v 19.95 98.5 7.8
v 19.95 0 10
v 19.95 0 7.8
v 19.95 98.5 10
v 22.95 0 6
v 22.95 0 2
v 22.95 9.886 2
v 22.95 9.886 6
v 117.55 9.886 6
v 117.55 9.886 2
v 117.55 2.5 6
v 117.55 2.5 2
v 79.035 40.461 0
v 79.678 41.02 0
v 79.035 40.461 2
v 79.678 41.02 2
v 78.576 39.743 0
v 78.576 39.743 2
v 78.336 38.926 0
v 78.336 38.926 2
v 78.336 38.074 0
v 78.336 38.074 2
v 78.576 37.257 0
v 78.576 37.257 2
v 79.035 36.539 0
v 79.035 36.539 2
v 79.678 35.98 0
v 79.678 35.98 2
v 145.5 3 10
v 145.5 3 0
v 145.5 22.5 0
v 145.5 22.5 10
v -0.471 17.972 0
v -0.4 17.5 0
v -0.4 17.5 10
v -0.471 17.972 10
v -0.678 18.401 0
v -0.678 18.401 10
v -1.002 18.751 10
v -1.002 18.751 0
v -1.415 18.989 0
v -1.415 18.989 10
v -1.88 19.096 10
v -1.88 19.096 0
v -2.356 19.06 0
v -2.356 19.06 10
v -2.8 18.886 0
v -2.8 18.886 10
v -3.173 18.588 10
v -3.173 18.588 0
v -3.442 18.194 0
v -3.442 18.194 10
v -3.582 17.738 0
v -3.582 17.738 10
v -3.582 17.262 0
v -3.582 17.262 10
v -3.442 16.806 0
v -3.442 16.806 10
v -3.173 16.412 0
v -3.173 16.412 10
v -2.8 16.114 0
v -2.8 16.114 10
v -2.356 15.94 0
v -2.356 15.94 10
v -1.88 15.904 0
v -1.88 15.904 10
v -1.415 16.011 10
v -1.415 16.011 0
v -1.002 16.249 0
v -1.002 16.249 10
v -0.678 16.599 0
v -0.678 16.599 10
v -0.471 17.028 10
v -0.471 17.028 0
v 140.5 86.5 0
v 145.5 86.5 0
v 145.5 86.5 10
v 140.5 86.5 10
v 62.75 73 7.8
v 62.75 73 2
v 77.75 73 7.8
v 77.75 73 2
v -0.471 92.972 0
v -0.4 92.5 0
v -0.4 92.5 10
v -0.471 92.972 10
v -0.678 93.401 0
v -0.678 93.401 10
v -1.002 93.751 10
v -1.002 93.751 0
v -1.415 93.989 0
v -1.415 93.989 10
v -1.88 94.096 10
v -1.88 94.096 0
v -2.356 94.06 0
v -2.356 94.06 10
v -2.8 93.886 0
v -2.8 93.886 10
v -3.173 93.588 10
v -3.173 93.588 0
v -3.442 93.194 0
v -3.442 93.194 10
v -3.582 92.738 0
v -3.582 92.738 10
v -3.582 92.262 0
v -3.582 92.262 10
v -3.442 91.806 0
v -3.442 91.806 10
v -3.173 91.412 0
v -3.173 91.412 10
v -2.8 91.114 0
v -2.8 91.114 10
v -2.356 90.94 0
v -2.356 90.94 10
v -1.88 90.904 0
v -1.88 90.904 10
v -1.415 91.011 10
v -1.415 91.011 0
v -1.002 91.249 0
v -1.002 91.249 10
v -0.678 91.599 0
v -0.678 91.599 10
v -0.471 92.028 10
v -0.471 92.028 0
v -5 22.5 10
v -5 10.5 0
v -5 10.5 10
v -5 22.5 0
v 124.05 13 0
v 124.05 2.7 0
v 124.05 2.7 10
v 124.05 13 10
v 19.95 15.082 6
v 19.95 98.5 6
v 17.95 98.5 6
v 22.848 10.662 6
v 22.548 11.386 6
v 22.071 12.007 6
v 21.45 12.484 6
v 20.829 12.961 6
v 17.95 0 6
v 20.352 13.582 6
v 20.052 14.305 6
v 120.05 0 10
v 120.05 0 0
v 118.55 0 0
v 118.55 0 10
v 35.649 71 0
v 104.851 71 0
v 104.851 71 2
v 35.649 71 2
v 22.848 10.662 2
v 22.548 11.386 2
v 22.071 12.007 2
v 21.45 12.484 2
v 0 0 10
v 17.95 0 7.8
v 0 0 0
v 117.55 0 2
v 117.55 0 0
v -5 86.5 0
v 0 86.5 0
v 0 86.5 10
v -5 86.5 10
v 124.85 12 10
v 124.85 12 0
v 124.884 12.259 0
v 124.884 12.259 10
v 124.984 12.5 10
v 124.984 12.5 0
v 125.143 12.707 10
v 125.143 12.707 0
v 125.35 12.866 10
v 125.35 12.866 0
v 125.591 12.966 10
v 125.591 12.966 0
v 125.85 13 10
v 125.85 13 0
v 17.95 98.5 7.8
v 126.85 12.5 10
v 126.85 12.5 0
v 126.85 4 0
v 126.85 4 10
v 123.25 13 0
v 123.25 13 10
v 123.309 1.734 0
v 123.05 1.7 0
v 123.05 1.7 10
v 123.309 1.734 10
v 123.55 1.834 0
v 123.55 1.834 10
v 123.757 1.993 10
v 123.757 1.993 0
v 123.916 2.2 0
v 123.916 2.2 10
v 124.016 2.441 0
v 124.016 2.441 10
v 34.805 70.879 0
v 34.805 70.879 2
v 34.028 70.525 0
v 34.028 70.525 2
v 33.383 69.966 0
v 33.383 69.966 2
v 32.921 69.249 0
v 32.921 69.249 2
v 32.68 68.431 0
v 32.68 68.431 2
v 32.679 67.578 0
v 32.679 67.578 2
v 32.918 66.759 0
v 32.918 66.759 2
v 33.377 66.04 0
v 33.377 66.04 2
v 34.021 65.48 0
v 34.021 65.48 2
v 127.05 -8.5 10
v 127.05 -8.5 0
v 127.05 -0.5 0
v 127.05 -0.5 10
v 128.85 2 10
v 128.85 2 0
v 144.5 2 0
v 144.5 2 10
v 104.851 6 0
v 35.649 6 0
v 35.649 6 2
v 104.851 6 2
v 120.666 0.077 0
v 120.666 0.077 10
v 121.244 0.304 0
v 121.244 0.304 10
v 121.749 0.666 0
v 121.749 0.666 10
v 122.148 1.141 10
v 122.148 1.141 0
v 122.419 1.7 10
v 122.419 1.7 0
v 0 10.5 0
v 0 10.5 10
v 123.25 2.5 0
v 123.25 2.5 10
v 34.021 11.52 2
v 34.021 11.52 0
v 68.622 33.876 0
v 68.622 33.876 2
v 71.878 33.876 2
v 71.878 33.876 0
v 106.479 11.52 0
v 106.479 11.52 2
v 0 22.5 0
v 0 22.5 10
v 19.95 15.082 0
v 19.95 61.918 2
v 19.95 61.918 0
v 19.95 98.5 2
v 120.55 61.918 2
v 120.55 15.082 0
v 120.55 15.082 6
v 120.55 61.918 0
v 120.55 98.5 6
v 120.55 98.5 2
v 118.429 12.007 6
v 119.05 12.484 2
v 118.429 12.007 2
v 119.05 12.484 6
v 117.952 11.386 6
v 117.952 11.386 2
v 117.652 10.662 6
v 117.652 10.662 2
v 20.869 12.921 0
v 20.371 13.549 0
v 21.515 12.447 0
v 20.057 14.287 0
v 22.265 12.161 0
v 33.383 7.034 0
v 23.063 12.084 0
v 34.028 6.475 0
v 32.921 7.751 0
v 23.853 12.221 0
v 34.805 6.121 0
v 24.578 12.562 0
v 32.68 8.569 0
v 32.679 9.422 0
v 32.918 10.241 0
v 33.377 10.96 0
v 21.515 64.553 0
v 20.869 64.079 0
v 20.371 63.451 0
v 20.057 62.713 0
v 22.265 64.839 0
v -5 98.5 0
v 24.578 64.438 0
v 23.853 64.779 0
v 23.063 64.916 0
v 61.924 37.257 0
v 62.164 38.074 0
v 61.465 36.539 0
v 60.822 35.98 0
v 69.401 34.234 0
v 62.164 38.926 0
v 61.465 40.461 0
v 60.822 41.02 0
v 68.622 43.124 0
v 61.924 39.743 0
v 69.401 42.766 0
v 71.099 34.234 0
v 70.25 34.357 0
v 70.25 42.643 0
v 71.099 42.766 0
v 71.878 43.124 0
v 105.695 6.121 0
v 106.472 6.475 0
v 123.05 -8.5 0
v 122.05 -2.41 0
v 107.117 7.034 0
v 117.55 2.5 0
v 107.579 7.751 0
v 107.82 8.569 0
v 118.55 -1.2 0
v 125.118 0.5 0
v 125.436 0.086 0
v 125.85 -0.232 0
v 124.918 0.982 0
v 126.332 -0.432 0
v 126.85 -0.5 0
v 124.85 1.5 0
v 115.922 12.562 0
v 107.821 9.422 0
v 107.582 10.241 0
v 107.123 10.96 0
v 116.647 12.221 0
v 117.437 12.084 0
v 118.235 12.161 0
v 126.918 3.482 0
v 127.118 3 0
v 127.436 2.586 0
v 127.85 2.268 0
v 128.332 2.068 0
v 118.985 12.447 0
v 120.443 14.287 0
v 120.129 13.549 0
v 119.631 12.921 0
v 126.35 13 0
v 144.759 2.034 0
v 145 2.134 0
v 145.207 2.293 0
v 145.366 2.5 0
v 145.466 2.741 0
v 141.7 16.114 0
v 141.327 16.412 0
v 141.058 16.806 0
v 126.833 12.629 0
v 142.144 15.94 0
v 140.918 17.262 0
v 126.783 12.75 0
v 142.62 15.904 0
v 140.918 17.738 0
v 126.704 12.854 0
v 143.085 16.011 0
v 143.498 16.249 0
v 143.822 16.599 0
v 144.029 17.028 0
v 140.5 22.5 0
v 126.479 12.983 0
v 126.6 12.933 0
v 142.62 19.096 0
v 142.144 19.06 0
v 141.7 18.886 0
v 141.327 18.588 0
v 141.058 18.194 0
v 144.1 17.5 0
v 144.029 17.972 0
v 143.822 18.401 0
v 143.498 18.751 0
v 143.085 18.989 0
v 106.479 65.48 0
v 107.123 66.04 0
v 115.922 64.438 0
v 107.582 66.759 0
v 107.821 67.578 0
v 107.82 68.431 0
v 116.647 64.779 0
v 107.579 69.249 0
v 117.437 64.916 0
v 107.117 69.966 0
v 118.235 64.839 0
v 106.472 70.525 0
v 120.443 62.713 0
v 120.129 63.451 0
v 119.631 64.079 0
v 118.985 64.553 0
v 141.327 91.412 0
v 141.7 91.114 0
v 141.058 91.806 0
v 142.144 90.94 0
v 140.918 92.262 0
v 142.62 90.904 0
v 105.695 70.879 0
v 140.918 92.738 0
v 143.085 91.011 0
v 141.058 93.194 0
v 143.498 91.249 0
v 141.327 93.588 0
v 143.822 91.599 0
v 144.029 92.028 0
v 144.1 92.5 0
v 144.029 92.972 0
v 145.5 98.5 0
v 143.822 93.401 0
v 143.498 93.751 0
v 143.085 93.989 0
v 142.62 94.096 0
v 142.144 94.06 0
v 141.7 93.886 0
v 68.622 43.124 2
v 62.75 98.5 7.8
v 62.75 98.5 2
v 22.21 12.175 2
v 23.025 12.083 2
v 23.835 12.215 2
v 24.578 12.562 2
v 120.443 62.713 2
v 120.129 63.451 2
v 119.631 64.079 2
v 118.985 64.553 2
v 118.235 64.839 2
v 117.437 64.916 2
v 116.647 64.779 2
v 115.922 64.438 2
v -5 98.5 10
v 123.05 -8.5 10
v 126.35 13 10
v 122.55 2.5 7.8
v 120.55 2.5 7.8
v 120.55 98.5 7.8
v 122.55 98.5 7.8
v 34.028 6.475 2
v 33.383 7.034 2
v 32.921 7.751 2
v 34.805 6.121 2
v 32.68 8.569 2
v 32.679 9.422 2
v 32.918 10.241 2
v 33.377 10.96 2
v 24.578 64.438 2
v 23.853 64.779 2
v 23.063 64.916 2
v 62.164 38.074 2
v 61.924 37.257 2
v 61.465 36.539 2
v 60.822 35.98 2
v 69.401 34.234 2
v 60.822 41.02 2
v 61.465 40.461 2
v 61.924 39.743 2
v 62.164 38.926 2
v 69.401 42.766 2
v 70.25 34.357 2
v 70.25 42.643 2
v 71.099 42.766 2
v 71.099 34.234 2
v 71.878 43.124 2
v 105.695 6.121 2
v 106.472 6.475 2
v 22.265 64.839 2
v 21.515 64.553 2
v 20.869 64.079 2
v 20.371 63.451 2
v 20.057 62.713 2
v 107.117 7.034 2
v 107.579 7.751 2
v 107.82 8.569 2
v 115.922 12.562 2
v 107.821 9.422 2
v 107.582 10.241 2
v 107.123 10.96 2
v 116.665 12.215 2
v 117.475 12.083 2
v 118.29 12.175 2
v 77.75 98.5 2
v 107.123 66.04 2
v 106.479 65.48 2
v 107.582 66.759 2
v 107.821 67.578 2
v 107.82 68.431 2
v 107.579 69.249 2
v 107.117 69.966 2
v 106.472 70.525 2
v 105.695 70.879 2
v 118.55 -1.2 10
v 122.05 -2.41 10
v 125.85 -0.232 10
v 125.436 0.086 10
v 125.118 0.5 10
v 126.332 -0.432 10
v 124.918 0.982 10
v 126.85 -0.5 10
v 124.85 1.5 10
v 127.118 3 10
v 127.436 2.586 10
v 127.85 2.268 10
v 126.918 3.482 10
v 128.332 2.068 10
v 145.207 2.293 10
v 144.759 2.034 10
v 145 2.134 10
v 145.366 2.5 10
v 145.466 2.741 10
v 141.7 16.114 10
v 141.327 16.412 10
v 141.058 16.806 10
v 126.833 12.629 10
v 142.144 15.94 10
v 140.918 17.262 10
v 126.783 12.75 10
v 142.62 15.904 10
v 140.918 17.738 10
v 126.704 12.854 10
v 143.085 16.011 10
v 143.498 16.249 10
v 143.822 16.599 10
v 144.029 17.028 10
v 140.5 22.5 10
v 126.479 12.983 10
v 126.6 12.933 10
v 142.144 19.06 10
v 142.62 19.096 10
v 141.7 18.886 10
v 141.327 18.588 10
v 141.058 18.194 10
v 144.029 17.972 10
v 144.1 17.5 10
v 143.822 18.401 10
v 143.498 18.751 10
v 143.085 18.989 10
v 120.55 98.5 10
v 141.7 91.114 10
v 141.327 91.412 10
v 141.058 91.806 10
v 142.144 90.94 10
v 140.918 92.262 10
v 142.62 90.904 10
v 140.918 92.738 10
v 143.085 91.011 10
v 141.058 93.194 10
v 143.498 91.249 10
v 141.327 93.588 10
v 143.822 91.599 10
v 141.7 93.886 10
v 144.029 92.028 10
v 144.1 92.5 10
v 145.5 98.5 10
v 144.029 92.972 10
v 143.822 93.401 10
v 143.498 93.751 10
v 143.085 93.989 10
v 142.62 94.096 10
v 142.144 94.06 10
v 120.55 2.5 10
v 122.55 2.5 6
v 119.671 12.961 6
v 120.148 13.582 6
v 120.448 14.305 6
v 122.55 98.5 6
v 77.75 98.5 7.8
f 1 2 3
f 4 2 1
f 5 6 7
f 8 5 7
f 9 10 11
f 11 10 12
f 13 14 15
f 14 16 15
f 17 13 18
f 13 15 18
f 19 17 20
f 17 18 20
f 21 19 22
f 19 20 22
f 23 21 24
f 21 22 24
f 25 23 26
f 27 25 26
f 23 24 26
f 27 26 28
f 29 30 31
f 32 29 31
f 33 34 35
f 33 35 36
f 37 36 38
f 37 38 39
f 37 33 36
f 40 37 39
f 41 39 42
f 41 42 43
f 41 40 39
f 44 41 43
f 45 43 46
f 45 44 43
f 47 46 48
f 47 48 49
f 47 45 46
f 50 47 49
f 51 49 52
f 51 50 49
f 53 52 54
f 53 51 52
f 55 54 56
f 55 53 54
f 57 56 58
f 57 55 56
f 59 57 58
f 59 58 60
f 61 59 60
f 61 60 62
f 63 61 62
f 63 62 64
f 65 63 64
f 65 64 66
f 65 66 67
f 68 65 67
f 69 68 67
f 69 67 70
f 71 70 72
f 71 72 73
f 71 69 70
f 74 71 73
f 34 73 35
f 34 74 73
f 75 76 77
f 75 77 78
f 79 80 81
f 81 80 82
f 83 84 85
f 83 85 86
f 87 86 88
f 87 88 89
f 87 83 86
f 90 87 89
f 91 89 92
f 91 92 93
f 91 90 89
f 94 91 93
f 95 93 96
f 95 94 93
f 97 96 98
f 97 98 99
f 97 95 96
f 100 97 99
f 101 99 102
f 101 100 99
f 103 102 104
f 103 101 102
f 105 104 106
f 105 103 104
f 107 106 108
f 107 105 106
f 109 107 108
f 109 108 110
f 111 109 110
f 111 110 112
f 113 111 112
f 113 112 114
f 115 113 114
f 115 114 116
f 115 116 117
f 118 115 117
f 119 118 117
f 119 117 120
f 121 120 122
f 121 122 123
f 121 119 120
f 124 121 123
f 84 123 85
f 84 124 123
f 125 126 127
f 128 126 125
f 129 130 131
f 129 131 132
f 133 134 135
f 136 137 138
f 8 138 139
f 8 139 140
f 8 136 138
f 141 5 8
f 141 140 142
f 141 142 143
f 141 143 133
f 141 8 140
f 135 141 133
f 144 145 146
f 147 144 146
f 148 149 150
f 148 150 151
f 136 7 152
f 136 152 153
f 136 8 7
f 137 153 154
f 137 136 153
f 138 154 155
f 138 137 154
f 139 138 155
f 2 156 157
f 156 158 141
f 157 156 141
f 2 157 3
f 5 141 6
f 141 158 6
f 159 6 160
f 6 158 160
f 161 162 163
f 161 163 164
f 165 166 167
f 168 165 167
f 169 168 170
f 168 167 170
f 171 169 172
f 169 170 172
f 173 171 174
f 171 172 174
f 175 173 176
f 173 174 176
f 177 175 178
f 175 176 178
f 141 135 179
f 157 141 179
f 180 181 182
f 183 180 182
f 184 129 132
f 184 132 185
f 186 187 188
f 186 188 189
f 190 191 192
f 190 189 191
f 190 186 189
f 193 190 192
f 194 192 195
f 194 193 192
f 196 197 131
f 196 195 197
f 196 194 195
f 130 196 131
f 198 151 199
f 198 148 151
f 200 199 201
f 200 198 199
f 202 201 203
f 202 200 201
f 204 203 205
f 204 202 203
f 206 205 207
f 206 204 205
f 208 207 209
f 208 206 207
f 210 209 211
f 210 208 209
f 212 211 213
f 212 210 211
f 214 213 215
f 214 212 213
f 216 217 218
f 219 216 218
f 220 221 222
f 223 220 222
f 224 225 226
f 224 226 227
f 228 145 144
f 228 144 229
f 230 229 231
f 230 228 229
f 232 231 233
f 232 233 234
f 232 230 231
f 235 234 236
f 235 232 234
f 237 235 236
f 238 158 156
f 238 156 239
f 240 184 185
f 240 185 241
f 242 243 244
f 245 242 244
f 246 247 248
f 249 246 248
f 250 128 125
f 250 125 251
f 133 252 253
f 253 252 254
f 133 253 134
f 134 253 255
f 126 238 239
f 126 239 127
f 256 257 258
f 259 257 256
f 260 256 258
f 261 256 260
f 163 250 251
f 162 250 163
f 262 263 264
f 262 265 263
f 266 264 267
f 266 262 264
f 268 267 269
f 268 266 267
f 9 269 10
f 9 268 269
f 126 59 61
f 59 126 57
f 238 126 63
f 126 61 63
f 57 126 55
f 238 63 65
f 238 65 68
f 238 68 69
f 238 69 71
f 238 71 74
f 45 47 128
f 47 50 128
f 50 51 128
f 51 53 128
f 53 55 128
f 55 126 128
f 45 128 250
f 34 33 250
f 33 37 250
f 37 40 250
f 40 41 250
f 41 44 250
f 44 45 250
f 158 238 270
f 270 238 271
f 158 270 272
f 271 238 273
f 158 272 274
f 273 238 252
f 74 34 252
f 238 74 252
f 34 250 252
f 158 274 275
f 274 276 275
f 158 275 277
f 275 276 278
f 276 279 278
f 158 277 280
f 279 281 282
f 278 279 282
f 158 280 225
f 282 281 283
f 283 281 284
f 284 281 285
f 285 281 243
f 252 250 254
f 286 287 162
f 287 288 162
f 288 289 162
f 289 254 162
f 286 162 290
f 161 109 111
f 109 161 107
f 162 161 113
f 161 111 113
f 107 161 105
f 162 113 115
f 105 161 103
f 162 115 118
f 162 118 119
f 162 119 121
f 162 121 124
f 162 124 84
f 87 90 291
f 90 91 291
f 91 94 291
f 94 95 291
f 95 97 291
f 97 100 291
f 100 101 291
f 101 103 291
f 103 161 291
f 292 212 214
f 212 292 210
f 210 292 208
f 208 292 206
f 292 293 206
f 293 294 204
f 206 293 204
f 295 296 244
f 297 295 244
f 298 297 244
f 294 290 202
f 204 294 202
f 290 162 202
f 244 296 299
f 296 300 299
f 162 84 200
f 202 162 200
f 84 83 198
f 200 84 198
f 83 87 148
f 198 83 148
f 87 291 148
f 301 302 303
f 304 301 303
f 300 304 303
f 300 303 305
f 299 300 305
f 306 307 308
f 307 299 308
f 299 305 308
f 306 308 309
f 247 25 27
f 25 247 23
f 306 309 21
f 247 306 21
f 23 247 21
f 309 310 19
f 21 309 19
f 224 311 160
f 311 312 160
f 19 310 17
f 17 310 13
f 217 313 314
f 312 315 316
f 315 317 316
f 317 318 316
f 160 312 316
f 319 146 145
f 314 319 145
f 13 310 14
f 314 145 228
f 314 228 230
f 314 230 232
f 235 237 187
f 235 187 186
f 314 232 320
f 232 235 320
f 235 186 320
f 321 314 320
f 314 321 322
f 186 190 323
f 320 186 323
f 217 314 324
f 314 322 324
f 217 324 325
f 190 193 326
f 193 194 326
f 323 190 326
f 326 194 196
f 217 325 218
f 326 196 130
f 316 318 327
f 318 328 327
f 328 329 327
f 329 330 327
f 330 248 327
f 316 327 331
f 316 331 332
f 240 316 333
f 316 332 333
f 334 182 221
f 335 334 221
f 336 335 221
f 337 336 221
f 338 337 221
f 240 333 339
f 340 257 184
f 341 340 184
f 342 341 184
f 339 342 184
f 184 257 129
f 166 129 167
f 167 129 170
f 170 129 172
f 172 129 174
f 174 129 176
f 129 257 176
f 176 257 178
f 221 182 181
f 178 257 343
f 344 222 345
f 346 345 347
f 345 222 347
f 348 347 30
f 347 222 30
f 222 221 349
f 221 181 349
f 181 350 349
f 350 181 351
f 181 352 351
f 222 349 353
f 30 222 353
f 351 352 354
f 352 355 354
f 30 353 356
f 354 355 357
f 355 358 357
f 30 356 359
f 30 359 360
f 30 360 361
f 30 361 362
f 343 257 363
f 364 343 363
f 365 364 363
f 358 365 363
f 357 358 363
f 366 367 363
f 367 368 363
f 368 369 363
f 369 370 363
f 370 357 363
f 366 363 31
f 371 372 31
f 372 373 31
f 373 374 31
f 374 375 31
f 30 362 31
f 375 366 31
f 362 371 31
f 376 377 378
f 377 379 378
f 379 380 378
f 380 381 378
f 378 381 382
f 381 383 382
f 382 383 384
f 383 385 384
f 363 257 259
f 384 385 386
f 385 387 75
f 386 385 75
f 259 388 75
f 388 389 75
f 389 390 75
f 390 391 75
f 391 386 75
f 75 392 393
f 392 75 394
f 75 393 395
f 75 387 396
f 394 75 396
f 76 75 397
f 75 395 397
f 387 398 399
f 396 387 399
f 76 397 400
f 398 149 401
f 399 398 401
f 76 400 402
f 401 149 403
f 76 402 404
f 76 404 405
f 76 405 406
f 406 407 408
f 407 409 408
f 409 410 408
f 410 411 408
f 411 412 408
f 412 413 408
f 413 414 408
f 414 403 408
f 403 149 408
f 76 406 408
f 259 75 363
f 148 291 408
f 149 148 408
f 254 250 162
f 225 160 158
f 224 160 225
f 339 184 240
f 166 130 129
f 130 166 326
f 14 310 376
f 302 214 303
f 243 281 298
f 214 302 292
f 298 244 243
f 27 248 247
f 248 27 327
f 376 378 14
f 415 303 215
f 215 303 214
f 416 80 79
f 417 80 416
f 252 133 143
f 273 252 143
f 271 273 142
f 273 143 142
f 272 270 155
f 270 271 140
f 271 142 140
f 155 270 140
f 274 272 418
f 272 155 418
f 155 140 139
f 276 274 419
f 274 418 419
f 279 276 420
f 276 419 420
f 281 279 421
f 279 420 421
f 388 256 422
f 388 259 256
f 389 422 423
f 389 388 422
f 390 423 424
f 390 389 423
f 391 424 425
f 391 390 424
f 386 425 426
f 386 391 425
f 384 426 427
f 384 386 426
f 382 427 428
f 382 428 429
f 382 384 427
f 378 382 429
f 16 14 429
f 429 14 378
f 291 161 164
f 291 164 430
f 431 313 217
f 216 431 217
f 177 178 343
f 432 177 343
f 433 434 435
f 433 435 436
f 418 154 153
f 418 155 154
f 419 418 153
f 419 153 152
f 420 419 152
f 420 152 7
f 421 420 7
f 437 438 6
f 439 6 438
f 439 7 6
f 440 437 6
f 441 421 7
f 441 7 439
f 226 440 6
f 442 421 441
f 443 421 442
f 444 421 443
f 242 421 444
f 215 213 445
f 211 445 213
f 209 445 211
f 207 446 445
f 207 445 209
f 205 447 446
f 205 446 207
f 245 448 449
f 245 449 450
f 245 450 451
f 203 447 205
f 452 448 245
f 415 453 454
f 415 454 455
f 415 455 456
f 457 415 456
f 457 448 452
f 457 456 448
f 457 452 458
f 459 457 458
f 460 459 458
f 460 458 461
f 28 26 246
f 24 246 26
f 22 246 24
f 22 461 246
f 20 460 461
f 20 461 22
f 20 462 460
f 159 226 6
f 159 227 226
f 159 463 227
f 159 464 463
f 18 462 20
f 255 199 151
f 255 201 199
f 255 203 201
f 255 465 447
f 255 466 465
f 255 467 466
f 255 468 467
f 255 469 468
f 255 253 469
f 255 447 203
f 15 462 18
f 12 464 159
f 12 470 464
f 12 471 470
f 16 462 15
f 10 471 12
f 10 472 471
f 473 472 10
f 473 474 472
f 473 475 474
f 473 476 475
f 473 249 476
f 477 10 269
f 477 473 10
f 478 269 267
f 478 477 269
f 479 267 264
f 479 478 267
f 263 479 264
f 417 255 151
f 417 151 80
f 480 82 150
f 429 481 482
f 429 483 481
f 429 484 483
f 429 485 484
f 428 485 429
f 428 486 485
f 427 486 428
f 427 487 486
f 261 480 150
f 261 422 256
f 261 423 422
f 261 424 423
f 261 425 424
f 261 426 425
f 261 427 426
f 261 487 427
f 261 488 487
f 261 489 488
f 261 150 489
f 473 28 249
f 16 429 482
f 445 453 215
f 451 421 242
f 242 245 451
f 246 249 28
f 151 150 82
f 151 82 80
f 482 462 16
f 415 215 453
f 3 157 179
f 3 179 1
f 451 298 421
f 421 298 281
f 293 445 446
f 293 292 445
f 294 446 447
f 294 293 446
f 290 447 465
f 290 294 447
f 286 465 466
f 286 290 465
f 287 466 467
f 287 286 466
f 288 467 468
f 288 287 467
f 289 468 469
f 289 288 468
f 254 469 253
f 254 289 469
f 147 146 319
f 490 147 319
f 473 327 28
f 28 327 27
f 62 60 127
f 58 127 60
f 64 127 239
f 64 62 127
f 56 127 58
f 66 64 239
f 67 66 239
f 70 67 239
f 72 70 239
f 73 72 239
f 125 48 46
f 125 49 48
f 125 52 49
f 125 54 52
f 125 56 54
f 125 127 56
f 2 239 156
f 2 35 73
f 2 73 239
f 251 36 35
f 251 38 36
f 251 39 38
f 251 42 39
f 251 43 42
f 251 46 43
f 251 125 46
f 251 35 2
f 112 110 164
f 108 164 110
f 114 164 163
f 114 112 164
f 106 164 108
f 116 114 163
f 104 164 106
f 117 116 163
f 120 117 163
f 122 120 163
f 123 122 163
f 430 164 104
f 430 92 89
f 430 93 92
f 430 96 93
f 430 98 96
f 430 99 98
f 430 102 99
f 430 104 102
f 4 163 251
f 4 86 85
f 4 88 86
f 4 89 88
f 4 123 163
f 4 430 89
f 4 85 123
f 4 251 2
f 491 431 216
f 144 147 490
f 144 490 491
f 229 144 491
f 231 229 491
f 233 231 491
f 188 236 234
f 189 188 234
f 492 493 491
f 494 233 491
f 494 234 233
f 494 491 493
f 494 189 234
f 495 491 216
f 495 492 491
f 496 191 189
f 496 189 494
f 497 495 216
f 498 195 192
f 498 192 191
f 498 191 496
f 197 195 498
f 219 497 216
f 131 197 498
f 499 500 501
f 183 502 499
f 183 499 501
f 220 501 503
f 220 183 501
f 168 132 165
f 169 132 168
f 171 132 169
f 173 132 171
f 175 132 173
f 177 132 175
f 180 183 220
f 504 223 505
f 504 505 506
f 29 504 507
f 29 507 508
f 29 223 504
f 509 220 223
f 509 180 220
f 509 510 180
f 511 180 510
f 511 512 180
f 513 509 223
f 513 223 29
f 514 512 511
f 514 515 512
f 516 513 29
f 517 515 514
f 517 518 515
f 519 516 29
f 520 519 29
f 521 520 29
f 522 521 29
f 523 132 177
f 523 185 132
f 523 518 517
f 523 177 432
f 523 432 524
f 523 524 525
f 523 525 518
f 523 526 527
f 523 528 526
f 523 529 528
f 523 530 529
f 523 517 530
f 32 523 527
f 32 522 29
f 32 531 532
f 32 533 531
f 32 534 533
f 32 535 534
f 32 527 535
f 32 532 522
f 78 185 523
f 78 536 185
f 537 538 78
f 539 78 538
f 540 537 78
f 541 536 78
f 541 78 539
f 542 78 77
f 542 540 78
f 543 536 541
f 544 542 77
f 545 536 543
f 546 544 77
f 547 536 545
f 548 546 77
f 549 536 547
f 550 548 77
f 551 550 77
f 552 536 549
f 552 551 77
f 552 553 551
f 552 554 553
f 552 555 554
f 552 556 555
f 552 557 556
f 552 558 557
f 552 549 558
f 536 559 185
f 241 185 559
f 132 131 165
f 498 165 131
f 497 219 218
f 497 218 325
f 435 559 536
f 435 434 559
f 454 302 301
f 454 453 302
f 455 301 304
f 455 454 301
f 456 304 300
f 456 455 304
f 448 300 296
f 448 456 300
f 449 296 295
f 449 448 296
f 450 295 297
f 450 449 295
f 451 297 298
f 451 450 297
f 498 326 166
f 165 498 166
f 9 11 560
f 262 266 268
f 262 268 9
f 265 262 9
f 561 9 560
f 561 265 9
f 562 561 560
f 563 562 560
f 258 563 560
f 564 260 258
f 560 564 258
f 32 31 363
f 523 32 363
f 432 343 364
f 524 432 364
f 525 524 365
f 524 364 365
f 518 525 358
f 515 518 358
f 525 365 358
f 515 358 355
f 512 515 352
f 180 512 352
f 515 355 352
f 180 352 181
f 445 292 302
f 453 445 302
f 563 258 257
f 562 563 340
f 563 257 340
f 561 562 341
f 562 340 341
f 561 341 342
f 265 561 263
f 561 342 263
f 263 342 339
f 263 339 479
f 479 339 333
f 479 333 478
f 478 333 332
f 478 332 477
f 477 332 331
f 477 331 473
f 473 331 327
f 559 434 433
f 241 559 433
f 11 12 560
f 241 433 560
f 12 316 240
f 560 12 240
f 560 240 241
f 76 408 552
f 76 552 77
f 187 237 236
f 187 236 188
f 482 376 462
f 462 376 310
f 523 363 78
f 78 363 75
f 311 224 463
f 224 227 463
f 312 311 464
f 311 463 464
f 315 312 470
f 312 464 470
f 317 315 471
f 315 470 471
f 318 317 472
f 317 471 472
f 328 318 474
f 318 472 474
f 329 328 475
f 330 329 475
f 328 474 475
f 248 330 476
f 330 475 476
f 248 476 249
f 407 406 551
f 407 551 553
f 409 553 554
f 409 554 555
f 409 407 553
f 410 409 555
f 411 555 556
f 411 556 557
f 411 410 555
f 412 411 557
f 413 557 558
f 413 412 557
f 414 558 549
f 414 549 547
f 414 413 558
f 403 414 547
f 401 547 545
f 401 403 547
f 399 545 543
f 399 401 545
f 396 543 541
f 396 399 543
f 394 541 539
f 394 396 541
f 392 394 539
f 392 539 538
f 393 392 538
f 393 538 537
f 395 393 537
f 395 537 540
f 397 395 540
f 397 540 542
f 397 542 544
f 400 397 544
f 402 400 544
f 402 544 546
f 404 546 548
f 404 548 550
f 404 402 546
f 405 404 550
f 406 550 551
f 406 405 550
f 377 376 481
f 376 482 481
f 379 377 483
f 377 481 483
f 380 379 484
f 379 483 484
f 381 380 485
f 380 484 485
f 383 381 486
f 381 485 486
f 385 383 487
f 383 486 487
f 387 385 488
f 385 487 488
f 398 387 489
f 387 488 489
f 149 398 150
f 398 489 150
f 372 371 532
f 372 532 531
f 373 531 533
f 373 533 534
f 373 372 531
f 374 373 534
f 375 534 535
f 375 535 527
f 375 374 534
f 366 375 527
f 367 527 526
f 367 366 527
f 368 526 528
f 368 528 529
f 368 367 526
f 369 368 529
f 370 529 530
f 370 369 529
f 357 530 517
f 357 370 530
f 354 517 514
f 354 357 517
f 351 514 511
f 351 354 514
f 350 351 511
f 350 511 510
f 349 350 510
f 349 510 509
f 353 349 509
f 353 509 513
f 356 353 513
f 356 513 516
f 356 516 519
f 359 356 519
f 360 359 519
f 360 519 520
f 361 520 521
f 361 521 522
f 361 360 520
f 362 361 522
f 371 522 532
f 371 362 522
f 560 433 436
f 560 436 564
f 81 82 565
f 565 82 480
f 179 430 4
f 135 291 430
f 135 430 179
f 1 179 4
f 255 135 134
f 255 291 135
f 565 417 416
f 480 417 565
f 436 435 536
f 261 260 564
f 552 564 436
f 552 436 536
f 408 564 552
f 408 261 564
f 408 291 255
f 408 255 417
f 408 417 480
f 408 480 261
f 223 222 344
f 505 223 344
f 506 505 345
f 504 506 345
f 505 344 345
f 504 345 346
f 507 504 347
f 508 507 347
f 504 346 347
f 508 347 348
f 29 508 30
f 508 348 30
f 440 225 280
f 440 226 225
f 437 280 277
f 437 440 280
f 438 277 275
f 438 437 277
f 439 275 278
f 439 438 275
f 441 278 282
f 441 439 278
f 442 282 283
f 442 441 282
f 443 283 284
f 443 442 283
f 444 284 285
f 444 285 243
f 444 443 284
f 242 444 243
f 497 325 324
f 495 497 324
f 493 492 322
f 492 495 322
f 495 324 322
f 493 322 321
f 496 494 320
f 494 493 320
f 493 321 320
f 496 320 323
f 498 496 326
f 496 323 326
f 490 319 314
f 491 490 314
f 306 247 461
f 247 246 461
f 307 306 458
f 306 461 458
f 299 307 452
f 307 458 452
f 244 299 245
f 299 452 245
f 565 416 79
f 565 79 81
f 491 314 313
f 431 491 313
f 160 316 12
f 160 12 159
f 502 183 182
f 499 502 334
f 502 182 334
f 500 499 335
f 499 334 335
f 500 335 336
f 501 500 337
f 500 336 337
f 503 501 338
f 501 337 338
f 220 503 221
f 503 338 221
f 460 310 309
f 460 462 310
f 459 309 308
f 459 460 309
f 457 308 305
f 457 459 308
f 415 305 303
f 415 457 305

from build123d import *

# Parameters (mm, degrees)
SKETCH2_W           = 140.5
SKETCH2_H           = 98.5
BOSS_EXTRUDE6_DEPTH = 10
SKETCH10_W          = 100.6
SKETCH10_H          = 71
CUT_EXTRUDE4_DEPTH  = 172.8793181275746
CUT_EXTRUDE1_DEPTH  = 172.8793181275746
SKETCH5_W           = 100.6
SKETCH5_H           = 6
BOSS_EXTRUDE3_DEPTH = 2
CUT_EXTRUDE2_DEPTH  = 172.8793181275746
SKETCH4_4_R         = 1.5999999999999908
SKETCH4_4_R_2       = 1.599999999999993
SKETCH4_4_R_3       = 1.6000000000000039
SKETCH4_4_R_4       = 1.6000000000000003
BOSS_EXTRUDE7_DEPTH = 10
FILLET1_R           = 3
SKETCH4_3_R         = 1.5999999999999908
SKETCH4_3_R_2       = 1.599999999999993
SKETCH4_3_R_3       = 1.6000000000000039
SKETCH4_3_R_4       = 1.6000000000000003
BOSS_EXTRUDE2_DEPTH = 10
SKETCH7_W           = 100.6
SKETCH7_H           = 27.5
CUT_EXTRUDE3_DEPTH  = 8
SKETCH8_W           = 15.000000000000007
SKETCH8_H           = 25.5
BOSS_EXTRUDE4_DEPTH = 5.8
BOSS_EXTRUDE5_DEPTH = 4
FILLET2_R           = 3


with BuildPart() as part:
    # Sketch2 → Boss-Extrude6 (new body)
    with BuildSketch(Plane.XY):
        with Locations((70.25, 49.25)):
            Rectangle(SKETCH2_W, SKETCH2_H)
    extrude(amount=BOSS_EXTRUDE6_DEPTH)

    # Sketch10 → Cut-Extrude4 (cut, through all)
    with BuildSketch(Plane(origin=(0, 0, 0), x_dir=(-1, 0, 0), z_dir=(0, 0, -1))):
        with Locations((-70.25000000000001, 35.5)):
            Rectangle(SKETCH10_W, SKETCH10_H)
    extrude(amount=-CUT_EXTRUDE4_DEPTH, mode=Mode.SUBTRACT)

    # Sketch3 → Cut-Extrude1 (cut, through all)
    with BuildSketch(Plane.XZ):
        Polygon((17.950000000000006, 7.800000000000001), (122.55000000000001, 7.800000000000013), (122.55000000000001, 6.000000000000013), (17.950000000000006, 6), align=None)
    extrude(amount=-CUT_EXTRUDE1_DEPTH, mode=Mode.SUBTRACT)

    # Sketch5 → Boss-Extrude3 (add)
    with BuildSketch(Plane.XY):
        with Locations((70.25000000000001, 3)):
            Rectangle(SKETCH5_W, SKETCH5_H)
        Polygon((21.57809178761083, 3.480214864097709), (122.17809178761084, 68.48021486409772), (118.92190821238917, 73.51978513590232), (18.321908212389175, 8.519785135902309), align=None)
        Polygon((18.32190821238918, 68.48021486409769), (118.92190821238916, 3.4802148640977055), (122.17809178761082, 8.519785135902305), (21.578091787610838, 73.5197851359023), align=None)
    extrude(amount=BOSS_EXTRUDE3_DEPTH)

    # Sketch4 → Cut-Extrude2 (cut, through all)
    with BuildSketch(Plane.XY):
        with BuildLine():
            ThreePointArc((120.05000000000001, 4.44e-15), (121.50773797371134, 0.46899039884100846), (122.41854385646542, 1.6999999999999988))
            Line((122.41854385646542, 1.7000000000000002), (123.05000000000001, 1.7000000000000002))
            ThreePointArc((123.05000000000001, 1.7000000000000028), (123.75710678118656, 1.99289321881345), (124.05000000000001, 2.7))
            Line((124.05000000000001, 2.7), (124.05000000000001, 12.999999999999996))
            Line((124.05000000000001, 12.999999999999998), (123.25000000000001, 12.999999999999998))
            Line((123.25000000000001, 12.999999999999998), (123.25000000000001, 2.5))
            Line((123.25000000000001, 2.5), (117.55, 2.5))
            Line((117.55, 2.5), (117.55, 0))
            Line((117.55, 0), (118.55, 0))
            Line((118.55, 0), (120.05000000000001, 0))
        make_face()
        with BuildLine():
            ThreePointArc((144.50000000000003, 2), (145.20710678118658, 2.2928932188134525), (145.50000000000006, 3))
            Line((145.50000000000006, 3), (145.50000000000003, -0.5000000000000178))
            Line((145.50000000000003, -0.5000000000000178), (127.05, -0.5000000000000178))
            Line((127.05, -0.5000000000000178), (126.85, -0.5000000000000178))
            ThreePointArc((126.85, -0.5000000000000178), (125.4357864376269, 0.08578643762688709), (124.85, 1.499999999999982))
            Line((124.85, 1.499999999999982), (124.85, 12))
            ThreePointArc((124.85, 12), (125.14289321881344, 12.707106781186548), (125.85, 12.999999999999998))
            Line((125.85, 12.999999999999998), (126.35, 13))
            ThreePointArc((126.35, 13), (126.70355339059327, 12.853553390593271), (126.85, 12.499999999999998))
            Line((126.85, 12.499999999999998), (126.85, 4))
            ThreePointArc((126.85, 4), (127.4357864376269, 2.585786437626905), (128.85, 2))
            Line((128.85, 2), (144.50000000000003, 2))
        make_face()
    extrude(amount=CUT_EXTRUDE2_DEPTH, mode=Mode.SUBTRACT)

    # Sketch4<4> → Boss-Extrude7 (add, through all)
    # profile 1 of 4: a face of its own
    with BuildSketch(Plane.XY):
        with BuildLine():
            Line((128.85, 2), (144.50000000000003, 2))
            ThreePointArc((144.50000000000003, 2), (145.20710678118658, 2.2928932188134525), (145.50000000000006, 3))
            Line((145.50000000000006, 3), (145.50000000000003, 22.5))
            Line((145.50000000000003, 22.5), (140.5, 22.500000000000004))
            Line((140.5, 22.500000000000004), (124.05000000000001, 22.5))
            Line((124.05000000000001, 22.5), (124.05000000000001, 12.999999999999998))
            Line((124.05000000000001, 12.999999999999998), (124.05000000000001, 2.7))
            ThreePointArc((124.05000000000001, 2.7), (123.75710678118656, 1.9928932188134527), (123.05000000000001, 1.7000000000000002))
            Line((123.05000000000001, 1.7000000000000002), (122.41854385646542, 1.7000000000000002))
            ThreePointArc((122.41854385646542, 1.7000000000000002), (121.50773797371134, 0.4689903988410107), (120.05000000000001, 0))
            Line((120.05000000000001, 0), (118.55, 0))
            Line((118.55, 0), (118.55, -1.2))
            Line((118.55, -1.2), (122.05, -2.409773966310486))
            Line((122.05, -2.409773966310486), (123.05, -8.50000000000002))
            Line((123.05, -8.50000000000002), (127.05, -8.500000000000018))
            Line((127.05, -8.500000000000018), (127.05, -0.5000000000000178))
            Line((127.05, -0.5000000000000178), (126.85, -0.5000000000000178))
            ThreePointArc((126.85, -0.5000000000000178), (125.4357864376269, 0.08578643762688709), (124.85, 1.499999999999982))
            Line((124.85, 1.499999999999982), (124.85, 12))
            ThreePointArc((124.85, 12), (125.14289321881344, 12.707106781186548), (125.85, 12.999999999999998))
            Line((125.85, 12.999999999999998), (126.35, 13))
            ThreePointArc((126.35, 13), (126.70355339059327, 12.853553390593271), (126.85, 12.499999999999998))
            Line((126.85, 12.499999999999998), (126.85, 4))
            ThreePointArc((126.85, 4), (127.4357864376269, 2.585786437626905), (128.85, 2))
        make_face()
        with Locations((142.50000000000003, 17.5)):
            Circle(SKETCH4_4_R, mode=Mode.SUBTRACT)
    # profile 2 of 4: a face of its own
    with BuildSketch(Plane.XY):
        Polygon((145.50000000000003, 98.5), (145.50000000000003, 86.50000000000001), (140.5, 86.50000000000003), (140.5, 98.5), align=None)
        with Locations((142.5, 92.5)):
            Circle(SKETCH4_4_R_2, mode=Mode.SUBTRACT)
    # profile 3 of 4: a face of its own
    with BuildSketch(Plane.XY):
        Polygon((0, 98.49999999999999), (0, 86.50000000000001), (-5.000000000000004, 86.5), (-5.000000000000004, 98.49999999999999), align=None)
        with Locations((-1.9999999999999913, 92.5)):
            Circle(SKETCH4_4_R_3, mode=Mode.SUBTRACT)
    # profile 4 of 4: a face of its own
    with BuildSketch(Plane.XY):
        Polygon((8.67e-15, 22.499999999999986), (1.041e-14, 10.49999999999999), (-4.999999999999993, 10.499999999999986), (-4.999999999999996, 22.499999999999982), align=None)
        with Locations((-2.0000000000000018, 17.5)):
            Circle(SKETCH4_4_R_4, mode=Mode.SUBTRACT)
    extrude(amount=BOSS_EXTRUDE7_DEPTH)

    # Fillet1
    fillet1_edges = [part.edges().sort_by_distance(p)[0] for p in [
        (19.95000000000001, 67.42826688999527, 1),
        (19.949999999999992, 9.571733110004725, 1),
        (25.4779438594842, 71.00000000000001, 1),
        (115.02205614051576, 71, 1),
        (120.55000000000001, 9.571733110004711, 1),
        (120.55000000000003, 67.42826688999531, 1),
        (75.77794385948422, 38.50000000000003, 1),
        (70.24999999999997, 42.07173311000473, 1),
        (64.72205614051575, 38.499999999999986, 1),
        (25.477943859484185, 6.000000000000001, 1),
        (70.25, 34.928266889995285, 1),
        (115.0220561405158, 5.999999999999968, 1),
    ]]
    fillet(fillet1_edges, radius=FILLET1_R)

    # Sketch4<3> → Boss-Extrude2 (add, through all)
    # profile 1 of 4: a face of its own
    with BuildSketch(Plane.XY):
        with BuildLine():
            Line((123.05000000000001, 1.7000000000000002), (122.41854385646542, 1.7000000000000002))
            ThreePointArc((122.41854385646542, 1.6999999999999988), (121.50773797371134, 0.46899039884100846), (120.05000000000001, 4.44e-15))
            Line((120.05000000000001, 0), (118.55, 0))
            Line((118.55, 0), (118.55, -1.2))
            Line((118.55, -1.2), (122.05, -2.409773966310486))
            Line((122.05, -2.4097739663104853), (123.05, -8.50000000000002))
            Line((123.05, -8.50000000000002), (127.05, -8.500000000000018))
            Line((127.05, -8.500000000000018), (127.05, -0.5000000000000178))
            Line((127.05, -0.5000000000000178), (126.85, -0.5000000000000178))
            ThreePointArc((126.85, -0.5000000000000151), (125.4357864376269, 0.08578643762688865), (124.85, 1.499999999999982))
            Line((124.85, 1.4999999999999822), (124.85, 12))
            ThreePointArc((124.85, 12), (125.14289321881344, 12.70710678118655), (125.85, 12.999999999999996))
            Line((125.85, 12.999999999999998), (126.35, 13))
            ThreePointArc((126.35, 13), (126.70355339059327, 12.853553390593273), (126.85, 12.499999999999998))
            Line((126.85, 12.499999999999998), (126.85, 4))
            ThreePointArc((126.85, 4), (127.4357864376269, 2.585786437626907), (128.85, 2.000000000000003))
            Line((128.85, 2), (144.50000000000003, 2))
            ThreePointArc((144.50000000000003, 2.000000000000009), (145.20710678118658, 2.292893218813456), (145.50000000000006, 3))
            Line((145.50000000000006, 3), (145.50000000000003, 22.5))
            Line((145.50000000000003, 22.5), (140.5, 22.500000000000004))
            Line((140.5, 22.500000000000004), (124.05000000000001, 22.5))
            Line((124.05000000000001, 22.5), (124.05000000000001, 12.999999999999998))
            Line((124.05000000000001, 12.999999999999996), (124.05000000000001, 2.7))
            ThreePointArc((124.05000000000001, 2.7), (123.75710678118656, 1.99289321881345), (123.05000000000001, 1.7000000000000028))
        make_face()
        with Locations((142.50000000000003, 17.5)):
            Circle(SKETCH4_3_R, mode=Mode.SUBTRACT)
    # profile 2 of 4: a face of its own
    with BuildSketch(Plane.XY):
        Polygon((145.50000000000003, 98.5), (145.50000000000003, 86.50000000000001), (140.5, 86.50000000000003), (140.5, 98.5), align=None)
        with Locations((142.5, 92.5)):
            Circle(SKETCH4_3_R_2, mode=Mode.SUBTRACT)
    # profile 3 of 4: a face of its own
    with BuildSketch(Plane.XY):
        Polygon((0, 98.49999999999999), (0, 86.50000000000001), (-5.000000000000004, 86.5), (-5.000000000000004, 98.49999999999999), align=None)
        with Locations((-1.9999999999999913, 92.5)):
            Circle(SKETCH4_3_R_3, mode=Mode.SUBTRACT)
    # profile 4 of 4: a face of its own
    with BuildSketch(Plane.XY):
        Polygon((8.67e-15, 22.499999999999986), (1.041e-14, 10.49999999999999), (-4.999999999999993, 10.499999999999986), (-4.999999999999996, 22.499999999999982), align=None)
        with Locations((-2.0000000000000018, 17.5)):
            Circle(SKETCH4_3_R_4, mode=Mode.SUBTRACT)
    extrude(amount=BOSS_EXTRUDE2_DEPTH)

    # Sketch7 → Cut-Extrude3 (cut)
    with BuildSketch(Plane.XY.offset(10)):
        with Locations((70.25000000000001, 84.75)):
            Rectangle(SKETCH7_W, SKETCH7_H)
    extrude(amount=-CUT_EXTRUDE3_DEPTH, mode=Mode.SUBTRACT)

    # Sketch8 → Boss-Extrude4 (add)
    with BuildSketch(Plane.XY.offset(2)):
        with Locations((70.25000000000001, 85.75)):
            Rectangle(SKETCH8_W, SKETCH8_H)
    extrude(amount=BOSS_EXTRUDE4_DEPTH)

    # Sketch9 → Boss-Extrude5 (add)
    with BuildSketch(Plane.XY.offset(2)):
        with BuildLine():
            ThreePointArc((120.55000000000001, 15.081836001321573), (119.67132034355964, 12.960515657761938), (117.55000000000001, 12.081836001321571))
            Line((117.55000000000001, 12.081836001321573), (117.55000000000001, 2.5))
            Line((117.55000000000001, 2.5000000000000004), (120.55000000000001, 2.5))
            Line((120.55000000000001, 2.5), (120.55000000000001, 15.081836001321573))
        make_face()
        with BuildLine():
            Line((19.95000000000001, 15.081836001321587), (19.95000000000001, 0))
            Line((19.95000000000001, 0), (22.95000000000001, 0))
            Line((22.95000000000001, 0), (22.95000000000001, 12.08183600132159))
            ThreePointArc((22.95000000000001, 12.081836001321593), (20.828679656440368, 12.960515657761945), (19.95000000000001, 15.081836001321587))
        make_face()
    extrude(amount=BOSS_EXTRUDE5_DEPTH)

    # Fillet2
    fillet2_edges = [part.edges().sort_by_distance(p)[0] for p in [
        (22.95000000000001, 12.08183600132159, 4),
        (117.55000000000001, 12.08183600132157, 4),
    ]]
    fillet(fillet2_edges, radius=FILLET2_R)


solid = part.part
